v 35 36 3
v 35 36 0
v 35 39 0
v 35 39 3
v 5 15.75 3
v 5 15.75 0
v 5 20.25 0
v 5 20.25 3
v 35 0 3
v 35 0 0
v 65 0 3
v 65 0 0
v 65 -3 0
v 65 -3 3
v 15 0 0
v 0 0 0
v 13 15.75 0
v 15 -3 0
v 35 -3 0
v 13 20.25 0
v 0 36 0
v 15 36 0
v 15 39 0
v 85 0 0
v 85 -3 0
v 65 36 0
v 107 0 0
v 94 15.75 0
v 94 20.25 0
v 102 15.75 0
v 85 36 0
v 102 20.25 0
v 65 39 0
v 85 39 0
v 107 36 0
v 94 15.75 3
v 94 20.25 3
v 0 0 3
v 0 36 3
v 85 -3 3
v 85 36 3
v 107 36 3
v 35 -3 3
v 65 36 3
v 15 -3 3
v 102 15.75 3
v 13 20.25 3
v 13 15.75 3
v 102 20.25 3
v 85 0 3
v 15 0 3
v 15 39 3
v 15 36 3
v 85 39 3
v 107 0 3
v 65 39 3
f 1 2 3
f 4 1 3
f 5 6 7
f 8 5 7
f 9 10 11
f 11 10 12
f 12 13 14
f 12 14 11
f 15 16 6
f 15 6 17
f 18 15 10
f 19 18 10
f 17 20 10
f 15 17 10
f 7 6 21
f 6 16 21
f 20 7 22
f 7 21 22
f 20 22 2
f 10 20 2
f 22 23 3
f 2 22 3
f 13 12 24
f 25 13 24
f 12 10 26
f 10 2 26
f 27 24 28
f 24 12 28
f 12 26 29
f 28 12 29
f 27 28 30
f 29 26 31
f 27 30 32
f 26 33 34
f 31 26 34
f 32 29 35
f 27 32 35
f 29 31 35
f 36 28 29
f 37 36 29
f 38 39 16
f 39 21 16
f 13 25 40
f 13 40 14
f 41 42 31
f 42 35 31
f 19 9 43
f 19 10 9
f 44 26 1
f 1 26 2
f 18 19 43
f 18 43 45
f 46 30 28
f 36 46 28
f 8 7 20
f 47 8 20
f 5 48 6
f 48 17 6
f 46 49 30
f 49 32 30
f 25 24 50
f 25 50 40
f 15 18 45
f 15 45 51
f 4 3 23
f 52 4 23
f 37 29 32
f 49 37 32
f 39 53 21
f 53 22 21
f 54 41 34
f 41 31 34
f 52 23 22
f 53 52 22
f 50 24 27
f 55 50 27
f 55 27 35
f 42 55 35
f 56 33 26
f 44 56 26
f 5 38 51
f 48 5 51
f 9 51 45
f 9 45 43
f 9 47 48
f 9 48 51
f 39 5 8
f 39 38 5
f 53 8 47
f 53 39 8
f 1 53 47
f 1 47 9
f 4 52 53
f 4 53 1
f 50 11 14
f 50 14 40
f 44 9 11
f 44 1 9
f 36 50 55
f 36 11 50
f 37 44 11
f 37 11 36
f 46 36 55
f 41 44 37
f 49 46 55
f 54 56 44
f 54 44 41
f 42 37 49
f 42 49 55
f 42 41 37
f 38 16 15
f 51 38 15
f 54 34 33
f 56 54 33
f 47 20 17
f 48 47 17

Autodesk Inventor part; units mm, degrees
ref_plane "YZ Plane" through (0, 0, 0) normal (1, 0, 0) x (0, 1, 0)
ref_plane "XZ Plane" through (0, 0, 0) normal (0, 1, 0) x (-1, 0, 0)
ref_plane "XY Plane" through (0, 0, 0) normal (0, 0, 1) x (1, 0, 0)
sketch "Sketch1" plane through (0, 0, 0) normal (0, 0, 1) x (1, 0, 0)
  line L0 (0, 0) -> (107, 0)
  line L1 (107, 0) -> (107, 36)
  line L2 (107, 36) -> (0, 36)
  line L3 (0, 36) -> (0, 0)
  line L4 (0, 15.75) -> (0, 20.25)
  line L5 (15, 36) -> (35, 36)
  line L6 (35, 36) -> (35, 39)
  line L7 (35, 39) -> (15, 39)
  line L8 (15, 39) -> (15, 36)
  line L9 (65, 36) -> (85, 36)
  line L10 (85, 36) -> (85, 39)
  line L11 (85, 39) -> (65, 39)
  line L12 (65, 39) -> (65, 36)
  line L13 (15, 0) -> (35, 0)
  line L14 (35, 0) -> (35, -3)
  line L15 (35, -3) -> (15, -3)
  line L16 (15, -3) -> (15, 0)
  line L17 (65, 0) -> (85, 0)
  line L18 (85, 0) -> (85, -3)
  line L19 (85, -3) -> (65, -3)
  line L20 (65, -3) -> (65, 0)
  line L21 (5, 20.25) -> (13, 20.25)
  line L22 (13, 20.25) -> (13, 15.75)
  line L23 (13, 15.75) -> (5, 15.75)
  line L24 (5, 15.75) -> (5, 20.25)
  line L25 (94, 20.25) -> (102, 20.25)
  line L26 (102, 20.25) -> (102, 15.75)
  line L27 (102, 15.75) -> (94, 15.75)
  line L28 (94, 15.75) -> (94, 20.25)
  point P0 (102, 18)
  dimension "d0" = 36
  dimension "d1" = 107
  dimension "d6" = 3
  dimension "d7" = 3
  dimension "d8" = 30
  dimension "d9" = 20
  dimension "d10" = 20
  dimension "d11" = 15
  dimension "d14" = 4.5
  dimension "d15" = 8
  dimension "d16" = 8
  dimension "d18" = 97
  dimension "d19" = 5
  dimension "d20" = 18
extrude "Extrusion1" add sketch "Sketch1" along normal blind 3
properties part number "TB6600holder"
